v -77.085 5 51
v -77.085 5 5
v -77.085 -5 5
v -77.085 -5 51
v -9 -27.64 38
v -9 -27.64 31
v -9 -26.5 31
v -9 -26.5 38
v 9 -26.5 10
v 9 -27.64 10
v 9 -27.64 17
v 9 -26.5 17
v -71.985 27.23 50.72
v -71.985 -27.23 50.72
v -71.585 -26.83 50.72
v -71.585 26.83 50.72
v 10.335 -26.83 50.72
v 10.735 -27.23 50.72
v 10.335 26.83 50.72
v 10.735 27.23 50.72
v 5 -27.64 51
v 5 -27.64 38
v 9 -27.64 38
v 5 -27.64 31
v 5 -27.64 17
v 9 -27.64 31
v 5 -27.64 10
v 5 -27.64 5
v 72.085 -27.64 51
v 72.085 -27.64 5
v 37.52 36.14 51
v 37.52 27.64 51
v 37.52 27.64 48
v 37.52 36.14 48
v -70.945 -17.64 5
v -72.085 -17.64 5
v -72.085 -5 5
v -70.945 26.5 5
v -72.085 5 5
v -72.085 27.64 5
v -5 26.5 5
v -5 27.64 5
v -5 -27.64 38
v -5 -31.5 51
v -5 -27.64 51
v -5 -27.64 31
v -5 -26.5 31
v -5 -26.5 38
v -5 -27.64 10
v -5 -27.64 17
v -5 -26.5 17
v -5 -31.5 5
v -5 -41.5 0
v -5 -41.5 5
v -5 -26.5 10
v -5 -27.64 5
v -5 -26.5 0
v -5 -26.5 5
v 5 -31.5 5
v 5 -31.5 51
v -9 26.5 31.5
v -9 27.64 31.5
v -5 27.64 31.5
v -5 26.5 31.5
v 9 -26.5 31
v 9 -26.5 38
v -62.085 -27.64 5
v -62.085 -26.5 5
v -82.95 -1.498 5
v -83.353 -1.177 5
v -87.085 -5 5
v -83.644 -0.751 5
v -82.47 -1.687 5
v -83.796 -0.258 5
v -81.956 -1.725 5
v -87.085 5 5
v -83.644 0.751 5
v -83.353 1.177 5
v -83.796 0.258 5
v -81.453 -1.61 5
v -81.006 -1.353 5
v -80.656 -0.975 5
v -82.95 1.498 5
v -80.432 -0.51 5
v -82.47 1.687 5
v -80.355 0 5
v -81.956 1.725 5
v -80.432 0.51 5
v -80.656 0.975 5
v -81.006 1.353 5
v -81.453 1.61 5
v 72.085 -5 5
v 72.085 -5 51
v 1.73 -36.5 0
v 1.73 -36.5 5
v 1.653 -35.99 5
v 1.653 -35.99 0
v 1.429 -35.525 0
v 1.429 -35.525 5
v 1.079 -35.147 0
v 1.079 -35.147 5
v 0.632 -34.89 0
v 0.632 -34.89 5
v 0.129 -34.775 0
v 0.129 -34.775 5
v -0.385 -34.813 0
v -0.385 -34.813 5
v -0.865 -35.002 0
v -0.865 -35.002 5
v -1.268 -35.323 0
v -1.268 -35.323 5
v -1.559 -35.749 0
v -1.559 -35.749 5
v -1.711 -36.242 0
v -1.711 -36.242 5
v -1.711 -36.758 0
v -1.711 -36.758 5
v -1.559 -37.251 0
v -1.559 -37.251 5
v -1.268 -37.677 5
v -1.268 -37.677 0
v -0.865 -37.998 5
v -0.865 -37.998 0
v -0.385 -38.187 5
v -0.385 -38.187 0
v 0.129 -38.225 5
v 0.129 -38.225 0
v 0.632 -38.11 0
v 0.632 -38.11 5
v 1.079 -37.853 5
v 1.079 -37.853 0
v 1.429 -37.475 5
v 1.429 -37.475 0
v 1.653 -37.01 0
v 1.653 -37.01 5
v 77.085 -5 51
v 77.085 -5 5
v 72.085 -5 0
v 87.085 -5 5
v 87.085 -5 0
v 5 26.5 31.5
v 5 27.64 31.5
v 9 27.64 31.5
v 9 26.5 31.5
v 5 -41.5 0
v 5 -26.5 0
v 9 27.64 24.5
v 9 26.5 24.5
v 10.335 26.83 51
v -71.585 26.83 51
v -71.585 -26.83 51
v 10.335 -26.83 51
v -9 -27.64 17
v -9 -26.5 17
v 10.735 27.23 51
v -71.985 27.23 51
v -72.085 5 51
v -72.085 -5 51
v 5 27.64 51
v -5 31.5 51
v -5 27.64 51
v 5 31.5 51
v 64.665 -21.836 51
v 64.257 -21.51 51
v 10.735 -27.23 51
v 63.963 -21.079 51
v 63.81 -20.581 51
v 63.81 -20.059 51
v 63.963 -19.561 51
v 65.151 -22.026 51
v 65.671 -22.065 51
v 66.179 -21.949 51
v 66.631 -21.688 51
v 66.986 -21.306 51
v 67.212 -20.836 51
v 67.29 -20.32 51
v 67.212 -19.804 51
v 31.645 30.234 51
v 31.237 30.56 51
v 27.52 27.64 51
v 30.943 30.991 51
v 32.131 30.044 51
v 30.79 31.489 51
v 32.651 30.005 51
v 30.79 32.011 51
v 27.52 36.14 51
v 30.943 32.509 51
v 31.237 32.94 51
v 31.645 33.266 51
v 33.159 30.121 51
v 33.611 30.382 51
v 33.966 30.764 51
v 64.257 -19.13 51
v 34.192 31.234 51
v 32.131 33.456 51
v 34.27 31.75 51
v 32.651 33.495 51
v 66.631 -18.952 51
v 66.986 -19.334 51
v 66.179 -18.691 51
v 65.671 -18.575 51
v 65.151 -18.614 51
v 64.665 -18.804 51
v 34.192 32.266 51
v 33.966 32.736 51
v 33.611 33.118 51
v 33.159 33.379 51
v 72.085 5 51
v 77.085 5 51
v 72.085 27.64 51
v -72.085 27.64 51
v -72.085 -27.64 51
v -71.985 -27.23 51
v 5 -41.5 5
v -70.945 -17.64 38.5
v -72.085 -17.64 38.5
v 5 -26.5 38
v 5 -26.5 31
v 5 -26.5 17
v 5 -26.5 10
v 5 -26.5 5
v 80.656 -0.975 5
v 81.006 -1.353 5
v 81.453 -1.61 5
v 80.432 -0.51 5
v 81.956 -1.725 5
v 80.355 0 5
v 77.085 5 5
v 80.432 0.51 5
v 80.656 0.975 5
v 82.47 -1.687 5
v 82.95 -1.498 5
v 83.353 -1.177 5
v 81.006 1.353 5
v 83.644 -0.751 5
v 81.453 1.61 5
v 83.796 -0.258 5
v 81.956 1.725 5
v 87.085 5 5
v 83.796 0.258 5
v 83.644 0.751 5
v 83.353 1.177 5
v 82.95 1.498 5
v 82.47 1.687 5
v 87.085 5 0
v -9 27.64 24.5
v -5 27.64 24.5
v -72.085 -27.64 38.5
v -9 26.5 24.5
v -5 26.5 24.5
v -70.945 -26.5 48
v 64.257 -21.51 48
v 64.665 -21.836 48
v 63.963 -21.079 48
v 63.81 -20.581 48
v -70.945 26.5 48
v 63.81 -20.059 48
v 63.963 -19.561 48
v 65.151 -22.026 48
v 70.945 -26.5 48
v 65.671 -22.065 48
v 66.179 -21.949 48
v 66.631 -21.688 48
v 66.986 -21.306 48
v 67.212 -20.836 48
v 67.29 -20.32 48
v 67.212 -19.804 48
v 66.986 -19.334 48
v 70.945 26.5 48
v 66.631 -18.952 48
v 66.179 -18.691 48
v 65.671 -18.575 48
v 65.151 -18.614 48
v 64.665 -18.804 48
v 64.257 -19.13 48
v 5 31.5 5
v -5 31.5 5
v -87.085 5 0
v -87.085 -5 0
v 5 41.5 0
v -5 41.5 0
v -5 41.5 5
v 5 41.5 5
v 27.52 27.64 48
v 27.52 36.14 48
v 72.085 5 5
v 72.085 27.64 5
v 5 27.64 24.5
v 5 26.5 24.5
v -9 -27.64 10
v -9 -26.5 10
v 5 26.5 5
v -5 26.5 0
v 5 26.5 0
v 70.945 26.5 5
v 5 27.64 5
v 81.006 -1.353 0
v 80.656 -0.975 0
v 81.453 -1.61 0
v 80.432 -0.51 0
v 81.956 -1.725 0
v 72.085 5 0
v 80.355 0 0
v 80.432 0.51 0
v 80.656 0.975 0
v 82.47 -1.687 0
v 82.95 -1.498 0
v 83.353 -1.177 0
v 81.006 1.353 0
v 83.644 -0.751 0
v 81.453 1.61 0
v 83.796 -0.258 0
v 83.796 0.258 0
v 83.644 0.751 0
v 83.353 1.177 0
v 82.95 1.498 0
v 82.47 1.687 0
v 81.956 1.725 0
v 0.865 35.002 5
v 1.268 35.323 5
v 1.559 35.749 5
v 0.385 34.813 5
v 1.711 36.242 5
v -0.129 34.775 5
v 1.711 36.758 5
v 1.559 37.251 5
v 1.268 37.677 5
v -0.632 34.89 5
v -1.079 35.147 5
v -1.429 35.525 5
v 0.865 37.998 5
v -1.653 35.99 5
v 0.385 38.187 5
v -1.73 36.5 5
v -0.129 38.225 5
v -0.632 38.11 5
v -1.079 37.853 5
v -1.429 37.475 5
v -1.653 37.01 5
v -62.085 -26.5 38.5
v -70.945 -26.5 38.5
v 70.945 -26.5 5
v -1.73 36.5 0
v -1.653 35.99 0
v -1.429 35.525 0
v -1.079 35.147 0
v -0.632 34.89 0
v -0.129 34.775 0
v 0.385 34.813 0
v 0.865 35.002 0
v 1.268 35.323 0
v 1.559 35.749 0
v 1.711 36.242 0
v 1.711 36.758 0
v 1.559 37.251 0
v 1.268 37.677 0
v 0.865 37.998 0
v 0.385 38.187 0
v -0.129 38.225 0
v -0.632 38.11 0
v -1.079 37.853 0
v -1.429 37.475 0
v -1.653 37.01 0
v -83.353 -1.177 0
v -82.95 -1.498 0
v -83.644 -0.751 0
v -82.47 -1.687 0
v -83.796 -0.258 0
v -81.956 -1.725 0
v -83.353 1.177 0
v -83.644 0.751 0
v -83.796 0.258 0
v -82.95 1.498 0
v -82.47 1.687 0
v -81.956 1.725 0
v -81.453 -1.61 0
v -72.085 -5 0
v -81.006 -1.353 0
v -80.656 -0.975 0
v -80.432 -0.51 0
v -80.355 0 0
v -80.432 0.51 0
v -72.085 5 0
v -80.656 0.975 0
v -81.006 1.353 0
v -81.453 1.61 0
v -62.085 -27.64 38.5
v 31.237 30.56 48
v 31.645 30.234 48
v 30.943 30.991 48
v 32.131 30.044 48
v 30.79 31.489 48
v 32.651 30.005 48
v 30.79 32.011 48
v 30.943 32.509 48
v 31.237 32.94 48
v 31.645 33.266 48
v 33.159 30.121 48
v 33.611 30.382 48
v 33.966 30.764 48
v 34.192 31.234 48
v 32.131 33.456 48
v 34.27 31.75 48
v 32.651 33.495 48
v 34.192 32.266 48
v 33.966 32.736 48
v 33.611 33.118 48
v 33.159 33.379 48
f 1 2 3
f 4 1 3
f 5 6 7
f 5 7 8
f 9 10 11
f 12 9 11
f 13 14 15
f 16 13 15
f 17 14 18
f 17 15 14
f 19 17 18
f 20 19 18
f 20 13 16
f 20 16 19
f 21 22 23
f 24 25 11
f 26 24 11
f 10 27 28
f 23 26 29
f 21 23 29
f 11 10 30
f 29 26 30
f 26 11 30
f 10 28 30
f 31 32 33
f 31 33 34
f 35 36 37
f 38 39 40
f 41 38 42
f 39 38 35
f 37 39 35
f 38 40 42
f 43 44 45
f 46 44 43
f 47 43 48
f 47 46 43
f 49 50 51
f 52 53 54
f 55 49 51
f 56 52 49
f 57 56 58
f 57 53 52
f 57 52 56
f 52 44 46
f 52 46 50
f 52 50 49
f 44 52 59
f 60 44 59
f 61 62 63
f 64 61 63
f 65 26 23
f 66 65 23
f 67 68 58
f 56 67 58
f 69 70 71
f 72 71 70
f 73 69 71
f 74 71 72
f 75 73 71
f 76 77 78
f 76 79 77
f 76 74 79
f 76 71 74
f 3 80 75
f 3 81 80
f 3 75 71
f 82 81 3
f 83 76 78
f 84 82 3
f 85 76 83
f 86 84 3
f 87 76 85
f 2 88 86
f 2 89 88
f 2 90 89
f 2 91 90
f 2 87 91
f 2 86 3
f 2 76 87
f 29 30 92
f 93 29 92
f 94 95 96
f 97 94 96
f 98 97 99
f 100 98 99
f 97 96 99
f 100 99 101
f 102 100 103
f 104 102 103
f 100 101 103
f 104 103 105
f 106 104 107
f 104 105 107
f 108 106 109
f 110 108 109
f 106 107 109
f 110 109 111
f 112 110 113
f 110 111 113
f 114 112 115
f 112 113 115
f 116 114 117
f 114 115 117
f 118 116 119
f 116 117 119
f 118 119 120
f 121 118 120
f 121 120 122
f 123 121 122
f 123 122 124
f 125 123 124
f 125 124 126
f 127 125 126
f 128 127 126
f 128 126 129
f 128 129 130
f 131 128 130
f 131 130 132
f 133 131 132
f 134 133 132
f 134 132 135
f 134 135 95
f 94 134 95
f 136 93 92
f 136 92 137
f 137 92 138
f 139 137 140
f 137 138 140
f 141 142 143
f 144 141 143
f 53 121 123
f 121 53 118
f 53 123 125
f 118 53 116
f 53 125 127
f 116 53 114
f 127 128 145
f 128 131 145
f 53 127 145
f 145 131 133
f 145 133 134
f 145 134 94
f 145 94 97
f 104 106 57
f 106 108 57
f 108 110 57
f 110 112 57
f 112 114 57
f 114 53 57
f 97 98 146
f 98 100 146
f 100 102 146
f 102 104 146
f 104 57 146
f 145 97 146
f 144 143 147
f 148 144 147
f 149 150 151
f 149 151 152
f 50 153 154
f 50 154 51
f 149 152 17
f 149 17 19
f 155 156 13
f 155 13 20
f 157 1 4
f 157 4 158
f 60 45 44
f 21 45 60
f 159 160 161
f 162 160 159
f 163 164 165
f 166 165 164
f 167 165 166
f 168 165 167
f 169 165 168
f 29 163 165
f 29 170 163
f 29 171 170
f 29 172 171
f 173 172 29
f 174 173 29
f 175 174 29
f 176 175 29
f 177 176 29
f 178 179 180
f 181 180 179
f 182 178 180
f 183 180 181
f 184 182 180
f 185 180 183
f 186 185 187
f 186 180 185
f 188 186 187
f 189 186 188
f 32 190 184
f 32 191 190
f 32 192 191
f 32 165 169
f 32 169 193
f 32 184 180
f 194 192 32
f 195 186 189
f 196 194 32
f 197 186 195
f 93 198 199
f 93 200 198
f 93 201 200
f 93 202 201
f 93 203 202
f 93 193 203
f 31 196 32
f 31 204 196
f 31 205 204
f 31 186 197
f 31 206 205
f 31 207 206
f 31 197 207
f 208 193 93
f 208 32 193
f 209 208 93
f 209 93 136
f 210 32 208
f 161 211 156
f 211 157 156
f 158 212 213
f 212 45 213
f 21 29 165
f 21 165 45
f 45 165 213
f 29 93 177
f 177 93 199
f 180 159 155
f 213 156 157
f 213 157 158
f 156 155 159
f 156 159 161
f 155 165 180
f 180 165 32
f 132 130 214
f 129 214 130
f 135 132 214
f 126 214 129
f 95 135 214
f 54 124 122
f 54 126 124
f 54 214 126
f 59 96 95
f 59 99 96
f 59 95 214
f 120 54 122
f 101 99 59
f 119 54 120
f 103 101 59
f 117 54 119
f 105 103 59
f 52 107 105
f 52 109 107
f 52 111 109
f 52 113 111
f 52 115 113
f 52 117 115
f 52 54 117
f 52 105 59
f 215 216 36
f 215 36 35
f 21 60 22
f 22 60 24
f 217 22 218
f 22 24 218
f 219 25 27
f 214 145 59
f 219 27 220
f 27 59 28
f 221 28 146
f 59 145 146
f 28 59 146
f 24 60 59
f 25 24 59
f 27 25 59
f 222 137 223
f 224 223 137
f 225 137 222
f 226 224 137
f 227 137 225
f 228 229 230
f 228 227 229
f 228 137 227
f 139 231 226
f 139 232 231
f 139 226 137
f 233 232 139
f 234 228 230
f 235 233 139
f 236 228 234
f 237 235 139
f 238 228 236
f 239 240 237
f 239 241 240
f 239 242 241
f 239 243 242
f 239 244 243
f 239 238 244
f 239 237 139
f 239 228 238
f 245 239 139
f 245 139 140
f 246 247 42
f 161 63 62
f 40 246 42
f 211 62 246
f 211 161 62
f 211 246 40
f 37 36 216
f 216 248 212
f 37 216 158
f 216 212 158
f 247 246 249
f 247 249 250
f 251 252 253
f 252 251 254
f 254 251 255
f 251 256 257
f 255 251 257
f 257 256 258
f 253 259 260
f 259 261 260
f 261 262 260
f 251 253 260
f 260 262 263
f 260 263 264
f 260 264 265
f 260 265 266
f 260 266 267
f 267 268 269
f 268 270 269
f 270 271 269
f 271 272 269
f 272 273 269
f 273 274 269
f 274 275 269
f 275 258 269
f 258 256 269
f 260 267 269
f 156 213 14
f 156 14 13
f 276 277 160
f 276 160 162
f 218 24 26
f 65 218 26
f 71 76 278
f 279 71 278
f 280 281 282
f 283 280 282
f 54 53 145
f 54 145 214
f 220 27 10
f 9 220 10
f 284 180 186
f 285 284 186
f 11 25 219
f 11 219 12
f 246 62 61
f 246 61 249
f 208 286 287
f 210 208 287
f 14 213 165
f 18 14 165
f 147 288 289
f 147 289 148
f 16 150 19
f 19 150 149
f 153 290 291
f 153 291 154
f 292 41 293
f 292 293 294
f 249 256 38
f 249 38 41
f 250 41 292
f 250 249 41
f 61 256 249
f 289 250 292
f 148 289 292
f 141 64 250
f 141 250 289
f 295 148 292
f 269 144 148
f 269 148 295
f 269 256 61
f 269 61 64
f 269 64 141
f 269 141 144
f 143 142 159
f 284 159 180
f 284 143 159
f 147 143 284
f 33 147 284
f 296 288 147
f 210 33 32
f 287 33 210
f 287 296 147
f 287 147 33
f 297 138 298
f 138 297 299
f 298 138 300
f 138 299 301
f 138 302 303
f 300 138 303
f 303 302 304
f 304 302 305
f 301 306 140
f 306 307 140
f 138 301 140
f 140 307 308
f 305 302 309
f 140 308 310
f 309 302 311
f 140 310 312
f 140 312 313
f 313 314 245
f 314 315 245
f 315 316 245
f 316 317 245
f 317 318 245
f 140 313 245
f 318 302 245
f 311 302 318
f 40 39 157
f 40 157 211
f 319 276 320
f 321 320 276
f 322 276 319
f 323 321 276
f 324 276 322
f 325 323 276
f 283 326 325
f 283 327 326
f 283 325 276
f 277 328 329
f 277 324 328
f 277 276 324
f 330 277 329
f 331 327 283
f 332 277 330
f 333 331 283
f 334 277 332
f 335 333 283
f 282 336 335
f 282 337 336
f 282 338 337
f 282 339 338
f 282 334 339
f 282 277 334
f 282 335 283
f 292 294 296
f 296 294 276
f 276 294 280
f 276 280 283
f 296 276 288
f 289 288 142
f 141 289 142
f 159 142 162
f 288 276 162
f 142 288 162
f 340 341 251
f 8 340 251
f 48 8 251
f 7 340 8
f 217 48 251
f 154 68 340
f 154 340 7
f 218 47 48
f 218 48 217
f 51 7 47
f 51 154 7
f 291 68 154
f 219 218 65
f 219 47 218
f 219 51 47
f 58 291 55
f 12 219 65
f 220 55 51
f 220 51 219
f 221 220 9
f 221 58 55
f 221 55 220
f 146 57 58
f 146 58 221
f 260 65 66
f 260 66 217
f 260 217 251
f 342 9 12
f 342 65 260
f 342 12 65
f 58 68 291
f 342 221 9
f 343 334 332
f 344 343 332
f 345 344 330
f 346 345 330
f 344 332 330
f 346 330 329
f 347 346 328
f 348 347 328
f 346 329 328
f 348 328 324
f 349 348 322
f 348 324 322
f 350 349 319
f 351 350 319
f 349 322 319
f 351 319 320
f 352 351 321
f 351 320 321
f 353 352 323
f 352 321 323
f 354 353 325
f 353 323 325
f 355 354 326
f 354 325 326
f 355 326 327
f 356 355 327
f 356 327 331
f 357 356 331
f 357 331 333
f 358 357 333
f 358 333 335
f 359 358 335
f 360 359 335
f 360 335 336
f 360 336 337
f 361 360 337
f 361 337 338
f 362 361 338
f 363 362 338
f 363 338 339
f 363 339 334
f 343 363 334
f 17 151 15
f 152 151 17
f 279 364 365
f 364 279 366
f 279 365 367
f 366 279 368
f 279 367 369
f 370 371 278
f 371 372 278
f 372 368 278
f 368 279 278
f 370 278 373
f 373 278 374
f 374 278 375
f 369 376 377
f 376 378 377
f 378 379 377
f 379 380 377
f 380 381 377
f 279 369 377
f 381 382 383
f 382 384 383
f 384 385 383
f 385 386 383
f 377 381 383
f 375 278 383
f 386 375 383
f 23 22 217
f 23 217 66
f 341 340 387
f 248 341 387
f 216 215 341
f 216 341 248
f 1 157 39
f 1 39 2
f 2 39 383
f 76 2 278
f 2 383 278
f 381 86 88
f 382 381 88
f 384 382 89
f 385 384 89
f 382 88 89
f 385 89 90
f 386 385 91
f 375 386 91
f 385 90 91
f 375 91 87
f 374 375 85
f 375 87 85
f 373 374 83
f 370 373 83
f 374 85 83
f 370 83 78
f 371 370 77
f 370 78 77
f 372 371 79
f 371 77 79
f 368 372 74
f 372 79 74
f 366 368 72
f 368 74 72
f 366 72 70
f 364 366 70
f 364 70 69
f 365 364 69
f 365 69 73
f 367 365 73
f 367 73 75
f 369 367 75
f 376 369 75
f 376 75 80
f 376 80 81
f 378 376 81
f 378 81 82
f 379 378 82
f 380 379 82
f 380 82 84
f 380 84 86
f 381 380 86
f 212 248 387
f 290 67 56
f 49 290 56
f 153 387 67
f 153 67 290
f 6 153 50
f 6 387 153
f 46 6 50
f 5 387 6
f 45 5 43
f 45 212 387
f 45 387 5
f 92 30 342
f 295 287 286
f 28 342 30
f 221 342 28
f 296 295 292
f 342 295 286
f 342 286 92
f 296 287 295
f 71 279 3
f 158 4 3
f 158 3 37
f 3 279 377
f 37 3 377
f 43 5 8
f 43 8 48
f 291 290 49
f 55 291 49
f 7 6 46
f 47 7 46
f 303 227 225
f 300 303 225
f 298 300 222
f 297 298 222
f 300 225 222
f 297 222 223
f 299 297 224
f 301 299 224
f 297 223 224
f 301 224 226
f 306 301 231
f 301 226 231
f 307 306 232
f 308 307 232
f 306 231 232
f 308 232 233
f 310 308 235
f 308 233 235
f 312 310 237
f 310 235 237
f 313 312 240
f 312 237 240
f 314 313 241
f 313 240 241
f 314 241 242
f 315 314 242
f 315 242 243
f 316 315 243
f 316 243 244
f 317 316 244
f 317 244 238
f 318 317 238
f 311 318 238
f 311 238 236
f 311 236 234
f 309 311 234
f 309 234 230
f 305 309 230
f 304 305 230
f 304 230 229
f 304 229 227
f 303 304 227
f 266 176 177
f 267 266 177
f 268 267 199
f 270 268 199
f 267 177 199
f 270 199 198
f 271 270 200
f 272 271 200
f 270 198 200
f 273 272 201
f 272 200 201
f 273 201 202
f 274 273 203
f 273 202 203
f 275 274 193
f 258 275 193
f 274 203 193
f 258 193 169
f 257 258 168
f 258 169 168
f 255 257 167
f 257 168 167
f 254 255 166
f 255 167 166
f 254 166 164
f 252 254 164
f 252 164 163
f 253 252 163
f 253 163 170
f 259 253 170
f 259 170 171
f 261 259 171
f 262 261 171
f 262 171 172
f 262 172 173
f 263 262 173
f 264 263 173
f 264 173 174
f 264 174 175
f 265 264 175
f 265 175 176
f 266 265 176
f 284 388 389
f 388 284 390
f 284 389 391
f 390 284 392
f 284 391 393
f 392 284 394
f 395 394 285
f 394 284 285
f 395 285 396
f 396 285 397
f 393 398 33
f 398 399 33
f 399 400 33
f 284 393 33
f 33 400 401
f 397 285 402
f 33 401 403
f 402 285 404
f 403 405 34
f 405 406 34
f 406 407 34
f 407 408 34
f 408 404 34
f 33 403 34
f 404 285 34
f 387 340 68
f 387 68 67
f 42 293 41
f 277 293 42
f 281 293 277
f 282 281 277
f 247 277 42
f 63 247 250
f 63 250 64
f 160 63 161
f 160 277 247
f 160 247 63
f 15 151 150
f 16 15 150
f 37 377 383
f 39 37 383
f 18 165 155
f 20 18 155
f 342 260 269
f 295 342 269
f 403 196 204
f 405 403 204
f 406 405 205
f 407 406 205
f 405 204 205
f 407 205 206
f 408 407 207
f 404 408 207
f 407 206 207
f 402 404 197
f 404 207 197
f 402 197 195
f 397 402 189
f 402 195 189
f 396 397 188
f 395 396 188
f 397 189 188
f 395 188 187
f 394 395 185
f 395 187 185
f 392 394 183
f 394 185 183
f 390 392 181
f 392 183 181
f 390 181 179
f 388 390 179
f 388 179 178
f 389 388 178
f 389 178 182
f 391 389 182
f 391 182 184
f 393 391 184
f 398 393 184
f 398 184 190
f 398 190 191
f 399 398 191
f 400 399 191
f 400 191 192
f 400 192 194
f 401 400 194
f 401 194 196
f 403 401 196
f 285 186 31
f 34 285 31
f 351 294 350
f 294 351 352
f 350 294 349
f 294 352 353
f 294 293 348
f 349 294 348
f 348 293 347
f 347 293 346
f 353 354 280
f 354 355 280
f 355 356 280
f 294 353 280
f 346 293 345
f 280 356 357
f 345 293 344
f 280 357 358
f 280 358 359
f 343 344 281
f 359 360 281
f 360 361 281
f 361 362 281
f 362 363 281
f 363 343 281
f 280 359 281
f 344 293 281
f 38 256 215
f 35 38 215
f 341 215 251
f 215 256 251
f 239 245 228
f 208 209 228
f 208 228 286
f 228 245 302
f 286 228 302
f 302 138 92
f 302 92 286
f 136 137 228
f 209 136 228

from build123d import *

# Parameters (mm, degrees)
SKETCH2_W             = 5
SKETCH2_H             = 10
BOSS_EXTRUDE1_DEPTH   = 48
SKETCH2_W_2           = 10
SKETCH2_H_2           = 5
BOSS_EXTRUDE1_2_DEPTH = 48
BOSS_EXTRUDE1_3_DEPTH = 48
BOSS_EXTRUDE1_4_DEPTH = 48
SKETCH3_W             = 165
SKETCH3_H             = 55.28
BOSS_EXTRUDE2_DEPTH   = 3
SKETCH4_W             = 10
SKETCH4_H             = 3.86
BOSS_EXTRUDE3_DEPTH   = 3
SKETCH5_W             = 10
SKETCH5_H             = 5
BOSS_EXTRUDE4_DEPTH   = 10
SKETCH7_W             = 5
SKETCH7_H             = 10
BOSS_EXTRUDE5_DEPTH   = 10
SKETCH8_R             = 1.73
CUT_EXTRUDE1_DEPTH    = 107.873978241
SKETCH10_W            = 10
SKETCH10_H            = 8.5
SKETCH10_W_2          = 1.85
SKETCH10_H_2          = 10
BOSS_EXTRUDE6_DEPTH   = 3
SKETCH11_R            = 1.75
CUT_EXTRUDE3_DEPTH    = 110.119417268
SKETCH12_W            = 82.72
SKETCH12_H            = 54.46
SKETCH12_W_2          = 81.92
SKETCH12_H_2          = 53.66
CUT_EXTRUDE4_DEPTH    = 0.28
CUT_EXTRUDE5_DEPTH    = 108.749929118
BOSS_EXTRUDE7_DEPTH   = 43
CUT_EXTRUDE6_DEPTH    = 33.5
SKETCH16_W            = 4
SKETCH16_H            = 7
CUT_EXTRUDE7_DEPTH    = 1.14
SKETCH17_W            = 4
SKETCH17_H            = 7
CUT_EXTRUDE8_DEPTH    = 1.14


with BuildPart() as part:
    # Sketch2 → Boss-Extrude1 (new body)
    with BuildSketch(Plane.XY):
        with Locations((-74.585, 0)):
            Rectangle(SKETCH2_W, SKETCH2_H)
    extrude(amount=BOSS_EXTRUDE1_DEPTH)



with BuildPart() as body_2:
    # Sketch2 → Boss-Extrude1 2 (new body)
    with BuildSketch(Plane.XY):
        with Locations((0, 29)):
            Rectangle(SKETCH2_W_2, SKETCH2_H_2)
    extrude(amount=BOSS_EXTRUDE1_2_DEPTH)


with BuildPart() as body_3:
    # Sketch2 → Boss-Extrude1 3 (new body)
    with BuildSketch(Plane.XY):
        with Locations((74.585, 0)):
            Rectangle(SKETCH2_W, SKETCH2_H)
    extrude(amount=BOSS_EXTRUDE1_3_DEPTH)


with BuildPart() as body_4:
    # Sketch2 → Boss-Extrude1 4 (new body)
    with BuildSketch(Plane.XY):
        with Locations((0, -29)):
            Rectangle(SKETCH2_W_2, SKETCH2_H_2)
    extrude(amount=BOSS_EXTRUDE1_4_DEPTH)


with BuildPart() as part_1:
    add(part.part)

    add(body_2.part)  # Boss-Extrude2 merges body 2

    add(body_3.part)  # Boss-Extrude2 merges body 3

    add(body_4.part)  # Boss-Extrude2 merges body 4
    # Sketch3 → Boss-Extrude2 (add)
    with BuildSketch(Plane.XY.offset(48)):
        Rectangle(SKETCH3_W, SKETCH3_H)
    extrude(amount=BOSS_EXTRUDE2_DEPTH)

    # Sketch4 → Boss-Extrude3 (add)
    with BuildSketch(Plane.XY.offset(48)):
        with Locations((0, 29.57)):
            Rectangle(SKETCH4_W, SKETCH4_H)
        with Locations((0, -29.57)):
            Rectangle(SKETCH4_W, SKETCH4_H)
    extrude(amount=BOSS_EXTRUDE3_DEPTH)

    # Sketch5 → Boss-Extrude4 (add)
    with BuildSketch(Plane(origin=(0, 5, 0), x_dir=(1, 0, 0), z_dir=(0, 1, 0))):
        with Locations((-82.085, -2.5)):
            Rectangle(SKETCH5_W, SKETCH5_H)
        with Locations((82.085, -2.5)):
            Rectangle(SKETCH5_W, SKETCH5_H)
    extrude(amount=-BOSS_EXTRUDE4_DEPTH)

    # Sketch7 → Boss-Extrude5 (add)
    with BuildSketch(Plane.ZY.offset(5)):
        with Locations((2.5, 36.5)):
            Rectangle(SKETCH7_W, SKETCH7_H)
        with Locations((2.5, -36.5)):
            Rectangle(SKETCH7_W, SKETCH7_H)
    extrude(amount=-BOSS_EXTRUDE5_DEPTH)

    # Sketch8 → Cut-Extrude1 (cut, through all)
    with BuildSketch(Plane.XY.offset(5)):
        with Locations((-82.085, 0)):
            Circle(SKETCH8_R)
        with Locations((0, -36.5)):
            Circle(SKETCH8_R)
        with Locations(Location((82.085, 0, 0), (0, 0, 180))):
            Circle(SKETCH8_R)
        with Locations(Location((0, 36.5, 0), (0, 0, 180))):
            Circle(SKETCH8_R)
    extrude(amount=-CUT_EXTRUDE1_DEPTH, mode=Mode.SUBTRACT)

    # Sketch10 → Boss-Extrude6 (add)
    with BuildSketch(Plane.XY.offset(51)):
        with Locations((32.52, 31.89)):
            Rectangle(SKETCH10_W, SKETCH10_H)
        with Locations((69.005, -20.32)):
            Rectangle(SKETCH10_W_2, SKETCH10_H_2)
    extrude(amount=-BOSS_EXTRUDE6_DEPTH)

    # Sketch11 → Cut-Extrude3 (cut, through all)
    with BuildSketch(Plane.XY.offset(51)):
        with Locations((32.52, 31.75)):
            Circle(SKETCH11_R)
        with Locations((65.54, -20.32)):
            Circle(SKETCH11_R)
    extrude(amount=-CUT_EXTRUDE3_DEPTH, mode=Mode.SUBTRACT)

    # Sketch12 → Cut-Extrude4 (cut)
    with BuildSketch(Plane.XY.offset(51)):
        with Locations((-30.625, 0)):
            Rectangle(SKETCH12_W, SKETCH12_H)
        with Locations((-30.625, 0)):
            Rectangle(SKETCH12_W_2, SKETCH12_H_2, mode=Mode.SUBTRACT)
    extrude(amount=-CUT_EXTRUDE4_DEPTH, mode=Mode.SUBTRACT)

    # Sketch13 → Cut-Extrude5 (cut, through all)
    with BuildSketch(Plane(origin=(0, 0, 48), x_dir=(-1, 0, 0), z_dir=(0, 0, -1))):
        Polygon((82.5, -27.64), (82.5, 27.64), (72.085, 27.64), (72.085, 5), (77.085, 5), (77.085, -5), (72.085, -5), (72.085, -27.64), align=None)
        Polygon((-82.5, 27.64), (-82.5, -27.64), (-72.085, -27.64), (-72.085, -5), (-77.085, -5), (-77.085, 5), (-72.085, 5), (-72.085, 27.64), align=None)
    extrude(amount=-CUT_EXTRUDE5_DEPTH, mode=Mode.SUBTRACT)

    # Sketch14 → Boss-Extrude7 (add)
    with BuildSketch(Plane(origin=(0, 0, 48), x_dir=(-1, 0, 0), z_dir=(0, 0, -1))):
        Polygon((72.085, -27.64), (5, -27.64), (5, -26.5), (70.945, -26.5), (70.945, -5), (70.945, 5), (70.945, 26.5), (5, 26.5), (5, 27.64), (72.085, 27.64), (72.085, 5), (72.085, -5), align=None)
        Polygon((-72.085, 5), (-72.085, -5), (-72.085, -27.64), (-5, -27.64), (-5, -26.5), (-70.945, -26.5), (-70.945, -5), (-70.945, 5), (-70.945, 26.5), (-37.52, 26.5), (-27.52, 26.5), (-5, 26.5), (-5, 27.64), (-27.52, 27.64), (-37.52, 27.64), (-72.085, 27.64), align=None)
    extrude(amount=BOSS_EXTRUDE7_DEPTH)

    # Sketch15 → Cut-Extrude6 (cut)
    with BuildSketch(Plane(origin=(0, 0, 5), x_dir=(-1, 0, 0), z_dir=(0, 0, -1))):
        Polygon((72.085, -17.64), (70.945, -17.64), (70.945, -26.5), (62.085, -26.5), (62.085, -27.64), (72.085, -27.64), align=None)
    extrude(amount=-CUT_EXTRUDE6_DEPTH, mode=Mode.SUBTRACT)

    # Sketch16 → Cut-Extrude7 (cut)
    with BuildSketch(Plane.XZ.offset(27.64)):
        with Locations((7, 34.5)):
            Rectangle(SKETCH16_W, SKETCH16_H)
        with Locations((7, 13.5)):
            Rectangle(SKETCH16_W, SKETCH16_H)
        with Locations((-7, 13.5)):
            Rectangle(SKETCH16_W, SKETCH16_H)
        with Locations((-7, 34.5)):
            Rectangle(SKETCH16_W, SKETCH16_H)
    extrude(amount=-CUT_EXTRUDE7_DEPTH, mode=Mode.SUBTRACT)

    # Sketch17 → Cut-Extrude8 (cut)
    with BuildSketch(Plane(origin=(0, 27.64, 0), x_dir=(1, 0, 0), z_dir=(0, 1, 0))):
        with Locations((7, -28)):
            Rectangle(SKETCH17_W, SKETCH17_H)
        with Locations((-7, -28)):
            Rectangle(SKETCH17_W, SKETCH17_H)
    extrude(amount=-CUT_EXTRUDE8_DEPTH, mode=Mode.SUBTRACT)


solid = part_1.part
